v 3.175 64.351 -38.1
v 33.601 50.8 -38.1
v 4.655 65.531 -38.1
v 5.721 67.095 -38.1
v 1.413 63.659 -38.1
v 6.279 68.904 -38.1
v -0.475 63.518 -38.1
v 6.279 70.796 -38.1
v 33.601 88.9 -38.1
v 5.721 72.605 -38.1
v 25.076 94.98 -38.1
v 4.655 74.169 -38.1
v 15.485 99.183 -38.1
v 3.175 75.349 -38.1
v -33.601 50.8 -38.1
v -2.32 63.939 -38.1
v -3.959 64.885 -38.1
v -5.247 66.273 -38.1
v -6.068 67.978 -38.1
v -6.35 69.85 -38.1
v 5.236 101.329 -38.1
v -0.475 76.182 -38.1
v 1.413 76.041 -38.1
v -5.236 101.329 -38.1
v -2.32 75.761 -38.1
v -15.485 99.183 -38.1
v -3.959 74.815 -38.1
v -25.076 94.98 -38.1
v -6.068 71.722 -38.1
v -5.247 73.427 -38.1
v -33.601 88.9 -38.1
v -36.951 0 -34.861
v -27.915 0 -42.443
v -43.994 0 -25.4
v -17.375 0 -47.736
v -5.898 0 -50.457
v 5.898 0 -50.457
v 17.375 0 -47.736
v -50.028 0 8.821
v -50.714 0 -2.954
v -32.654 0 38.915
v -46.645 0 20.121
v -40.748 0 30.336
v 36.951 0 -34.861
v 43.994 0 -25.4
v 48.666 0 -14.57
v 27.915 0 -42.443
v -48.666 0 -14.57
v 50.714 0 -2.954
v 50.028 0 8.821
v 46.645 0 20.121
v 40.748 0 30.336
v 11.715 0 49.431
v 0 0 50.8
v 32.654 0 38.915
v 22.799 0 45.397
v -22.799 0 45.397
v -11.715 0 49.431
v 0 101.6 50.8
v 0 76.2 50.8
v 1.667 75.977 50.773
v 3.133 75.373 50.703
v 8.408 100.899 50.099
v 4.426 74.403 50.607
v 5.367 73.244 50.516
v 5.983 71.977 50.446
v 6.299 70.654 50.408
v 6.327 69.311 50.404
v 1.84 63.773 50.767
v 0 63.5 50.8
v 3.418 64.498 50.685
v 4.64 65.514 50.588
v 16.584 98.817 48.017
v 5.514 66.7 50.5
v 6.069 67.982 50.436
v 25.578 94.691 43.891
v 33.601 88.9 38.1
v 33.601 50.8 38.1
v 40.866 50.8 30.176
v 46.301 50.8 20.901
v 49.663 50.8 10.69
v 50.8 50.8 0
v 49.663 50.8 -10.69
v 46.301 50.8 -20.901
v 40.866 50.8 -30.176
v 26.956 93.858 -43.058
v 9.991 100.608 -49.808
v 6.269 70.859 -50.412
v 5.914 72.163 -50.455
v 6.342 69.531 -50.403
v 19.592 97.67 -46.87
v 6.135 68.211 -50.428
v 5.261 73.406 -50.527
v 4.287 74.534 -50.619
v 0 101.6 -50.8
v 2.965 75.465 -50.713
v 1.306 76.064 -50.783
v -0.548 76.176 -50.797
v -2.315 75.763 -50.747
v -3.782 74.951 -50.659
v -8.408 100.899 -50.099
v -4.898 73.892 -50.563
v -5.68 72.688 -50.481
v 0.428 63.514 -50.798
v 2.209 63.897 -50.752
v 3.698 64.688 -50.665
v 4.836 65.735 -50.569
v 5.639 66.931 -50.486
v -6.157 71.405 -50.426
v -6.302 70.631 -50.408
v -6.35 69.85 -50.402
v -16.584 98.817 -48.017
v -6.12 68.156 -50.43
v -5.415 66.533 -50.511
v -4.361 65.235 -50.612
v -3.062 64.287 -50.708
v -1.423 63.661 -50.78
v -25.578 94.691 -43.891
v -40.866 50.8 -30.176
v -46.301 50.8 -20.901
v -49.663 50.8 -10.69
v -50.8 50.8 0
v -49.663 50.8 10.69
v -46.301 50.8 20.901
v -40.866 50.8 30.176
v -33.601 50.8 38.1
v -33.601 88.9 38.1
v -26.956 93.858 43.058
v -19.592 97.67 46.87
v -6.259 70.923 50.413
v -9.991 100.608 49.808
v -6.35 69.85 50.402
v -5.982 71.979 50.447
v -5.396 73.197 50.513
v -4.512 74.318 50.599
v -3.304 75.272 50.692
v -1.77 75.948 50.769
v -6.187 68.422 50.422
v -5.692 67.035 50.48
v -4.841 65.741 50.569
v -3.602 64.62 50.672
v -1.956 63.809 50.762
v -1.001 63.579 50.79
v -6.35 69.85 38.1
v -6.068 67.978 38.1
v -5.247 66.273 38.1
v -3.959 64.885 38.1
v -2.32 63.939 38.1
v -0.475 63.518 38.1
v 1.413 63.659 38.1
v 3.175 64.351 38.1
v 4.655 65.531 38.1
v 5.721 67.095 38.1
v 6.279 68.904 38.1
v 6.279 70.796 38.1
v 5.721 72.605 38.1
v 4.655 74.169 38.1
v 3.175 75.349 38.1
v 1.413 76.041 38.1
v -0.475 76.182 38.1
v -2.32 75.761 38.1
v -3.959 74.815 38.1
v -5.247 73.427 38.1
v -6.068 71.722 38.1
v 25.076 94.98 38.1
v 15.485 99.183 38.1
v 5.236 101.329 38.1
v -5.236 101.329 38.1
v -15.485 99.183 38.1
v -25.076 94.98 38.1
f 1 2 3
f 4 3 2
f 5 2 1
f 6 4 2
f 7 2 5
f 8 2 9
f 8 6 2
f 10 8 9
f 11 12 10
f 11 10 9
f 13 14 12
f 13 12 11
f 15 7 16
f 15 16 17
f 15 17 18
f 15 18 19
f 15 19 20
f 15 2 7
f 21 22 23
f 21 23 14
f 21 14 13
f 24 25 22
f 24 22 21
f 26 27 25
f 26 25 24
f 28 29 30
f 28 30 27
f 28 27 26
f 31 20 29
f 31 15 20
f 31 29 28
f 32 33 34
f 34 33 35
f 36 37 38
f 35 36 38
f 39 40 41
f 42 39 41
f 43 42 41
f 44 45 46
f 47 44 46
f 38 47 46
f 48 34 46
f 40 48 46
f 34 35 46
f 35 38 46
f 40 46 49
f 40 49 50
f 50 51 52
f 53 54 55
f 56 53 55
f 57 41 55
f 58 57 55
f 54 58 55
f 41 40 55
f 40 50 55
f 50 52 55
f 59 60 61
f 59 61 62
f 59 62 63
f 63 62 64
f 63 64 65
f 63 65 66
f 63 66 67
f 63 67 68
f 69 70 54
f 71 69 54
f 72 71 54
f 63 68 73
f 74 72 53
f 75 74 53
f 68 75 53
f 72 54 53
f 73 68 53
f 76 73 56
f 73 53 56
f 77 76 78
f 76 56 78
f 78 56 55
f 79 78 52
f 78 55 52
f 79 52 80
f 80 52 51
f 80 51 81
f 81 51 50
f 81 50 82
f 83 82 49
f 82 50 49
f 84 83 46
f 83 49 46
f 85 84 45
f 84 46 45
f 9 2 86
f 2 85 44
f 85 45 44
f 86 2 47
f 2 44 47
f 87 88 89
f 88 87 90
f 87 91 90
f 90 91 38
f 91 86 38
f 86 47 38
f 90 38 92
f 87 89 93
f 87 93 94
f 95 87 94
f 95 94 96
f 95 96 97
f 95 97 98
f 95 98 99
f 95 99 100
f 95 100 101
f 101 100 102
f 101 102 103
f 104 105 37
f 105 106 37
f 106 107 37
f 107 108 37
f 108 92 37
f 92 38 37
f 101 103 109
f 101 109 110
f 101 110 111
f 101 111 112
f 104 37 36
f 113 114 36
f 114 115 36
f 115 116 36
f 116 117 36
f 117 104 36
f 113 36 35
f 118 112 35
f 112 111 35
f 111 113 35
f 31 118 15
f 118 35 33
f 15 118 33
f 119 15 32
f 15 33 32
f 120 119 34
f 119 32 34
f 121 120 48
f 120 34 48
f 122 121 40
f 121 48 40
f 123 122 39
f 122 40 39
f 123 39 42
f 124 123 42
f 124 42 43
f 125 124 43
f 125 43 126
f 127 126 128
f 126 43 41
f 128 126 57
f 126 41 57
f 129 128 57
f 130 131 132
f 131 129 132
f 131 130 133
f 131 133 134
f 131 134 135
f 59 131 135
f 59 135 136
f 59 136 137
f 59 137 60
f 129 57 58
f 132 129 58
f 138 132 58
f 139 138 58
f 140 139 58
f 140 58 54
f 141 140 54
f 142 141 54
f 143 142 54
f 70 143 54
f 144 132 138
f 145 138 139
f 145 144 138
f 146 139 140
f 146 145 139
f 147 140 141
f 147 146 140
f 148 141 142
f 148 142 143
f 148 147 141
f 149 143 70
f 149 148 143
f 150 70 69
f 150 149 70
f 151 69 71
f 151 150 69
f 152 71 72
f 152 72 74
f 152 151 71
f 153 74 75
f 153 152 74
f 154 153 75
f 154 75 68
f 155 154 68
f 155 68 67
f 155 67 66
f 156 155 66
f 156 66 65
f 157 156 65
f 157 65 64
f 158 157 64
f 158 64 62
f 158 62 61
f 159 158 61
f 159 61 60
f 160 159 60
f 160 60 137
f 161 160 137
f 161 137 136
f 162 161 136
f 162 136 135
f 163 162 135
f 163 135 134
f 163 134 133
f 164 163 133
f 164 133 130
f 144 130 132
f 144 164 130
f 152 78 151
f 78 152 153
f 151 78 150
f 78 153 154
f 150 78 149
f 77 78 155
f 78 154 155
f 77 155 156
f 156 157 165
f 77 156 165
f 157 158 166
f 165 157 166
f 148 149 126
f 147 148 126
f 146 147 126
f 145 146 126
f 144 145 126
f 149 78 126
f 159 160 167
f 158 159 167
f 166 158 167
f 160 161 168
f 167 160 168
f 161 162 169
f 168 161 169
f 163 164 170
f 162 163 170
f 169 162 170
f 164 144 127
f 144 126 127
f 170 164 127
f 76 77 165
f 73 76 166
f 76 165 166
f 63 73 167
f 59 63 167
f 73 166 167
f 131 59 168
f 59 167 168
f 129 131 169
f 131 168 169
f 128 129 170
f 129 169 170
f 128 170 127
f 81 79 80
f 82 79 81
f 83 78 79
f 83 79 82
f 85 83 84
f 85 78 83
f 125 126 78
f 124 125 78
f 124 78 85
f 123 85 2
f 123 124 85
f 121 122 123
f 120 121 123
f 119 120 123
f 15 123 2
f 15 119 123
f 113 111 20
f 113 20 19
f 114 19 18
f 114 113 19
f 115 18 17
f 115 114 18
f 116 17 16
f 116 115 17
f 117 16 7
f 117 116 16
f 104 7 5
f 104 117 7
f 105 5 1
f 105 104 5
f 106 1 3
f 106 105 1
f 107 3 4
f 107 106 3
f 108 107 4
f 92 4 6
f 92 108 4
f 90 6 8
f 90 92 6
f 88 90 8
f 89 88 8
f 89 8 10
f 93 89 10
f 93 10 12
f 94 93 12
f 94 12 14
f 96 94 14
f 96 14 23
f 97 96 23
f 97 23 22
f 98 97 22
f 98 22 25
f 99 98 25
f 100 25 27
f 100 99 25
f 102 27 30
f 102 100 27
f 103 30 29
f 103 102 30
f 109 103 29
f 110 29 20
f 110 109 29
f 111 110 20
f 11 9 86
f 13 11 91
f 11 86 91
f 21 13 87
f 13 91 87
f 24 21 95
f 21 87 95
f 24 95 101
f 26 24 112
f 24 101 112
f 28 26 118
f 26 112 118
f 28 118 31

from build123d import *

# Parameters (mm, degrees)
SKETCH1_R               = 50.8
BOSS_EXTRUDE1_DEPTH     = 101.6
CUT_EXTRUDE1_DEPTH      = 96.52
CUT_EXTRUDE1_DEPTH_BACK = 101.6
SKETCH2_R               = 6.35
CUT_EXTRUDE2_DEPTH      = 103.886
CUT_EXTRUDE2_DEPTH_BACK = 86.36
SKETCH3_W               = 76.2
SKETCH3_H               = 82.476489684


with BuildPart() as part:
    # Sketch1 → Boss-Extrude1 (new body)
    with BuildSketch(Plane(origin=(0, 0, 0), x_dir=(1, 0, 0), z_dir=(0, 1, 0))):
        with Locations(Location((0, 0, 0), (0, 0, 270))):
            Circle(SKETCH1_R)
    extrude(amount=BOSS_EXTRUDE1_DEPTH)

    # Sketch2 → Cut-Extrude1 (cut, two sides: drawn at the far end of the back side and taken through both)
    with BuildSketch(Plane.XY.offset(-CUT_EXTRUDE1_DEPTH_BACK)):
        with Locations(Location((0, 69.85, 0), (0, 0, 180))):
            Circle(SKETCH2_R)
        with BuildLine():
            Line((-50.8, 50.8), (-71.743329605, 50.8))
            Line((-71.743329605, 50.8), (-71.743329605, 136.317810242))
            Line((-71.743329605, 136.317810242), (67.424530317, 136.317810242))
            Line((67.424530317, 136.317810242), (67.424530317, 50.8))
            Line((67.424530317, 50.8), (50.8, 50.8))
            ThreePointArc((50.8, 50.8), (0, 101.6), (-50.8, 50.8))
        make_face()
    extrude(amount=CUT_EXTRUDE1_DEPTH + CUT_EXTRUDE1_DEPTH_BACK, mode=Mode.SUBTRACT)

    # Sketch3 → Cut-Extrude2 (cut, two sides: drawn at the far end of the back side and taken through both)
    with BuildSketch(Plane(origin=(0, 0, 0), x_dir=(0, 0, -1), z_dir=(1, 0, 0)).offset(-CUT_EXTRUDE2_DEPTH_BACK)):
        with Locations((0, 92.038244842)):
            Rectangle(SKETCH3_W, SKETCH3_H)
    extrude(amount=CUT_EXTRUDE2_DEPTH + CUT_EXTRUDE2_DEPTH_BACK, mode=Mode.SUBTRACT)


solid = part.part
